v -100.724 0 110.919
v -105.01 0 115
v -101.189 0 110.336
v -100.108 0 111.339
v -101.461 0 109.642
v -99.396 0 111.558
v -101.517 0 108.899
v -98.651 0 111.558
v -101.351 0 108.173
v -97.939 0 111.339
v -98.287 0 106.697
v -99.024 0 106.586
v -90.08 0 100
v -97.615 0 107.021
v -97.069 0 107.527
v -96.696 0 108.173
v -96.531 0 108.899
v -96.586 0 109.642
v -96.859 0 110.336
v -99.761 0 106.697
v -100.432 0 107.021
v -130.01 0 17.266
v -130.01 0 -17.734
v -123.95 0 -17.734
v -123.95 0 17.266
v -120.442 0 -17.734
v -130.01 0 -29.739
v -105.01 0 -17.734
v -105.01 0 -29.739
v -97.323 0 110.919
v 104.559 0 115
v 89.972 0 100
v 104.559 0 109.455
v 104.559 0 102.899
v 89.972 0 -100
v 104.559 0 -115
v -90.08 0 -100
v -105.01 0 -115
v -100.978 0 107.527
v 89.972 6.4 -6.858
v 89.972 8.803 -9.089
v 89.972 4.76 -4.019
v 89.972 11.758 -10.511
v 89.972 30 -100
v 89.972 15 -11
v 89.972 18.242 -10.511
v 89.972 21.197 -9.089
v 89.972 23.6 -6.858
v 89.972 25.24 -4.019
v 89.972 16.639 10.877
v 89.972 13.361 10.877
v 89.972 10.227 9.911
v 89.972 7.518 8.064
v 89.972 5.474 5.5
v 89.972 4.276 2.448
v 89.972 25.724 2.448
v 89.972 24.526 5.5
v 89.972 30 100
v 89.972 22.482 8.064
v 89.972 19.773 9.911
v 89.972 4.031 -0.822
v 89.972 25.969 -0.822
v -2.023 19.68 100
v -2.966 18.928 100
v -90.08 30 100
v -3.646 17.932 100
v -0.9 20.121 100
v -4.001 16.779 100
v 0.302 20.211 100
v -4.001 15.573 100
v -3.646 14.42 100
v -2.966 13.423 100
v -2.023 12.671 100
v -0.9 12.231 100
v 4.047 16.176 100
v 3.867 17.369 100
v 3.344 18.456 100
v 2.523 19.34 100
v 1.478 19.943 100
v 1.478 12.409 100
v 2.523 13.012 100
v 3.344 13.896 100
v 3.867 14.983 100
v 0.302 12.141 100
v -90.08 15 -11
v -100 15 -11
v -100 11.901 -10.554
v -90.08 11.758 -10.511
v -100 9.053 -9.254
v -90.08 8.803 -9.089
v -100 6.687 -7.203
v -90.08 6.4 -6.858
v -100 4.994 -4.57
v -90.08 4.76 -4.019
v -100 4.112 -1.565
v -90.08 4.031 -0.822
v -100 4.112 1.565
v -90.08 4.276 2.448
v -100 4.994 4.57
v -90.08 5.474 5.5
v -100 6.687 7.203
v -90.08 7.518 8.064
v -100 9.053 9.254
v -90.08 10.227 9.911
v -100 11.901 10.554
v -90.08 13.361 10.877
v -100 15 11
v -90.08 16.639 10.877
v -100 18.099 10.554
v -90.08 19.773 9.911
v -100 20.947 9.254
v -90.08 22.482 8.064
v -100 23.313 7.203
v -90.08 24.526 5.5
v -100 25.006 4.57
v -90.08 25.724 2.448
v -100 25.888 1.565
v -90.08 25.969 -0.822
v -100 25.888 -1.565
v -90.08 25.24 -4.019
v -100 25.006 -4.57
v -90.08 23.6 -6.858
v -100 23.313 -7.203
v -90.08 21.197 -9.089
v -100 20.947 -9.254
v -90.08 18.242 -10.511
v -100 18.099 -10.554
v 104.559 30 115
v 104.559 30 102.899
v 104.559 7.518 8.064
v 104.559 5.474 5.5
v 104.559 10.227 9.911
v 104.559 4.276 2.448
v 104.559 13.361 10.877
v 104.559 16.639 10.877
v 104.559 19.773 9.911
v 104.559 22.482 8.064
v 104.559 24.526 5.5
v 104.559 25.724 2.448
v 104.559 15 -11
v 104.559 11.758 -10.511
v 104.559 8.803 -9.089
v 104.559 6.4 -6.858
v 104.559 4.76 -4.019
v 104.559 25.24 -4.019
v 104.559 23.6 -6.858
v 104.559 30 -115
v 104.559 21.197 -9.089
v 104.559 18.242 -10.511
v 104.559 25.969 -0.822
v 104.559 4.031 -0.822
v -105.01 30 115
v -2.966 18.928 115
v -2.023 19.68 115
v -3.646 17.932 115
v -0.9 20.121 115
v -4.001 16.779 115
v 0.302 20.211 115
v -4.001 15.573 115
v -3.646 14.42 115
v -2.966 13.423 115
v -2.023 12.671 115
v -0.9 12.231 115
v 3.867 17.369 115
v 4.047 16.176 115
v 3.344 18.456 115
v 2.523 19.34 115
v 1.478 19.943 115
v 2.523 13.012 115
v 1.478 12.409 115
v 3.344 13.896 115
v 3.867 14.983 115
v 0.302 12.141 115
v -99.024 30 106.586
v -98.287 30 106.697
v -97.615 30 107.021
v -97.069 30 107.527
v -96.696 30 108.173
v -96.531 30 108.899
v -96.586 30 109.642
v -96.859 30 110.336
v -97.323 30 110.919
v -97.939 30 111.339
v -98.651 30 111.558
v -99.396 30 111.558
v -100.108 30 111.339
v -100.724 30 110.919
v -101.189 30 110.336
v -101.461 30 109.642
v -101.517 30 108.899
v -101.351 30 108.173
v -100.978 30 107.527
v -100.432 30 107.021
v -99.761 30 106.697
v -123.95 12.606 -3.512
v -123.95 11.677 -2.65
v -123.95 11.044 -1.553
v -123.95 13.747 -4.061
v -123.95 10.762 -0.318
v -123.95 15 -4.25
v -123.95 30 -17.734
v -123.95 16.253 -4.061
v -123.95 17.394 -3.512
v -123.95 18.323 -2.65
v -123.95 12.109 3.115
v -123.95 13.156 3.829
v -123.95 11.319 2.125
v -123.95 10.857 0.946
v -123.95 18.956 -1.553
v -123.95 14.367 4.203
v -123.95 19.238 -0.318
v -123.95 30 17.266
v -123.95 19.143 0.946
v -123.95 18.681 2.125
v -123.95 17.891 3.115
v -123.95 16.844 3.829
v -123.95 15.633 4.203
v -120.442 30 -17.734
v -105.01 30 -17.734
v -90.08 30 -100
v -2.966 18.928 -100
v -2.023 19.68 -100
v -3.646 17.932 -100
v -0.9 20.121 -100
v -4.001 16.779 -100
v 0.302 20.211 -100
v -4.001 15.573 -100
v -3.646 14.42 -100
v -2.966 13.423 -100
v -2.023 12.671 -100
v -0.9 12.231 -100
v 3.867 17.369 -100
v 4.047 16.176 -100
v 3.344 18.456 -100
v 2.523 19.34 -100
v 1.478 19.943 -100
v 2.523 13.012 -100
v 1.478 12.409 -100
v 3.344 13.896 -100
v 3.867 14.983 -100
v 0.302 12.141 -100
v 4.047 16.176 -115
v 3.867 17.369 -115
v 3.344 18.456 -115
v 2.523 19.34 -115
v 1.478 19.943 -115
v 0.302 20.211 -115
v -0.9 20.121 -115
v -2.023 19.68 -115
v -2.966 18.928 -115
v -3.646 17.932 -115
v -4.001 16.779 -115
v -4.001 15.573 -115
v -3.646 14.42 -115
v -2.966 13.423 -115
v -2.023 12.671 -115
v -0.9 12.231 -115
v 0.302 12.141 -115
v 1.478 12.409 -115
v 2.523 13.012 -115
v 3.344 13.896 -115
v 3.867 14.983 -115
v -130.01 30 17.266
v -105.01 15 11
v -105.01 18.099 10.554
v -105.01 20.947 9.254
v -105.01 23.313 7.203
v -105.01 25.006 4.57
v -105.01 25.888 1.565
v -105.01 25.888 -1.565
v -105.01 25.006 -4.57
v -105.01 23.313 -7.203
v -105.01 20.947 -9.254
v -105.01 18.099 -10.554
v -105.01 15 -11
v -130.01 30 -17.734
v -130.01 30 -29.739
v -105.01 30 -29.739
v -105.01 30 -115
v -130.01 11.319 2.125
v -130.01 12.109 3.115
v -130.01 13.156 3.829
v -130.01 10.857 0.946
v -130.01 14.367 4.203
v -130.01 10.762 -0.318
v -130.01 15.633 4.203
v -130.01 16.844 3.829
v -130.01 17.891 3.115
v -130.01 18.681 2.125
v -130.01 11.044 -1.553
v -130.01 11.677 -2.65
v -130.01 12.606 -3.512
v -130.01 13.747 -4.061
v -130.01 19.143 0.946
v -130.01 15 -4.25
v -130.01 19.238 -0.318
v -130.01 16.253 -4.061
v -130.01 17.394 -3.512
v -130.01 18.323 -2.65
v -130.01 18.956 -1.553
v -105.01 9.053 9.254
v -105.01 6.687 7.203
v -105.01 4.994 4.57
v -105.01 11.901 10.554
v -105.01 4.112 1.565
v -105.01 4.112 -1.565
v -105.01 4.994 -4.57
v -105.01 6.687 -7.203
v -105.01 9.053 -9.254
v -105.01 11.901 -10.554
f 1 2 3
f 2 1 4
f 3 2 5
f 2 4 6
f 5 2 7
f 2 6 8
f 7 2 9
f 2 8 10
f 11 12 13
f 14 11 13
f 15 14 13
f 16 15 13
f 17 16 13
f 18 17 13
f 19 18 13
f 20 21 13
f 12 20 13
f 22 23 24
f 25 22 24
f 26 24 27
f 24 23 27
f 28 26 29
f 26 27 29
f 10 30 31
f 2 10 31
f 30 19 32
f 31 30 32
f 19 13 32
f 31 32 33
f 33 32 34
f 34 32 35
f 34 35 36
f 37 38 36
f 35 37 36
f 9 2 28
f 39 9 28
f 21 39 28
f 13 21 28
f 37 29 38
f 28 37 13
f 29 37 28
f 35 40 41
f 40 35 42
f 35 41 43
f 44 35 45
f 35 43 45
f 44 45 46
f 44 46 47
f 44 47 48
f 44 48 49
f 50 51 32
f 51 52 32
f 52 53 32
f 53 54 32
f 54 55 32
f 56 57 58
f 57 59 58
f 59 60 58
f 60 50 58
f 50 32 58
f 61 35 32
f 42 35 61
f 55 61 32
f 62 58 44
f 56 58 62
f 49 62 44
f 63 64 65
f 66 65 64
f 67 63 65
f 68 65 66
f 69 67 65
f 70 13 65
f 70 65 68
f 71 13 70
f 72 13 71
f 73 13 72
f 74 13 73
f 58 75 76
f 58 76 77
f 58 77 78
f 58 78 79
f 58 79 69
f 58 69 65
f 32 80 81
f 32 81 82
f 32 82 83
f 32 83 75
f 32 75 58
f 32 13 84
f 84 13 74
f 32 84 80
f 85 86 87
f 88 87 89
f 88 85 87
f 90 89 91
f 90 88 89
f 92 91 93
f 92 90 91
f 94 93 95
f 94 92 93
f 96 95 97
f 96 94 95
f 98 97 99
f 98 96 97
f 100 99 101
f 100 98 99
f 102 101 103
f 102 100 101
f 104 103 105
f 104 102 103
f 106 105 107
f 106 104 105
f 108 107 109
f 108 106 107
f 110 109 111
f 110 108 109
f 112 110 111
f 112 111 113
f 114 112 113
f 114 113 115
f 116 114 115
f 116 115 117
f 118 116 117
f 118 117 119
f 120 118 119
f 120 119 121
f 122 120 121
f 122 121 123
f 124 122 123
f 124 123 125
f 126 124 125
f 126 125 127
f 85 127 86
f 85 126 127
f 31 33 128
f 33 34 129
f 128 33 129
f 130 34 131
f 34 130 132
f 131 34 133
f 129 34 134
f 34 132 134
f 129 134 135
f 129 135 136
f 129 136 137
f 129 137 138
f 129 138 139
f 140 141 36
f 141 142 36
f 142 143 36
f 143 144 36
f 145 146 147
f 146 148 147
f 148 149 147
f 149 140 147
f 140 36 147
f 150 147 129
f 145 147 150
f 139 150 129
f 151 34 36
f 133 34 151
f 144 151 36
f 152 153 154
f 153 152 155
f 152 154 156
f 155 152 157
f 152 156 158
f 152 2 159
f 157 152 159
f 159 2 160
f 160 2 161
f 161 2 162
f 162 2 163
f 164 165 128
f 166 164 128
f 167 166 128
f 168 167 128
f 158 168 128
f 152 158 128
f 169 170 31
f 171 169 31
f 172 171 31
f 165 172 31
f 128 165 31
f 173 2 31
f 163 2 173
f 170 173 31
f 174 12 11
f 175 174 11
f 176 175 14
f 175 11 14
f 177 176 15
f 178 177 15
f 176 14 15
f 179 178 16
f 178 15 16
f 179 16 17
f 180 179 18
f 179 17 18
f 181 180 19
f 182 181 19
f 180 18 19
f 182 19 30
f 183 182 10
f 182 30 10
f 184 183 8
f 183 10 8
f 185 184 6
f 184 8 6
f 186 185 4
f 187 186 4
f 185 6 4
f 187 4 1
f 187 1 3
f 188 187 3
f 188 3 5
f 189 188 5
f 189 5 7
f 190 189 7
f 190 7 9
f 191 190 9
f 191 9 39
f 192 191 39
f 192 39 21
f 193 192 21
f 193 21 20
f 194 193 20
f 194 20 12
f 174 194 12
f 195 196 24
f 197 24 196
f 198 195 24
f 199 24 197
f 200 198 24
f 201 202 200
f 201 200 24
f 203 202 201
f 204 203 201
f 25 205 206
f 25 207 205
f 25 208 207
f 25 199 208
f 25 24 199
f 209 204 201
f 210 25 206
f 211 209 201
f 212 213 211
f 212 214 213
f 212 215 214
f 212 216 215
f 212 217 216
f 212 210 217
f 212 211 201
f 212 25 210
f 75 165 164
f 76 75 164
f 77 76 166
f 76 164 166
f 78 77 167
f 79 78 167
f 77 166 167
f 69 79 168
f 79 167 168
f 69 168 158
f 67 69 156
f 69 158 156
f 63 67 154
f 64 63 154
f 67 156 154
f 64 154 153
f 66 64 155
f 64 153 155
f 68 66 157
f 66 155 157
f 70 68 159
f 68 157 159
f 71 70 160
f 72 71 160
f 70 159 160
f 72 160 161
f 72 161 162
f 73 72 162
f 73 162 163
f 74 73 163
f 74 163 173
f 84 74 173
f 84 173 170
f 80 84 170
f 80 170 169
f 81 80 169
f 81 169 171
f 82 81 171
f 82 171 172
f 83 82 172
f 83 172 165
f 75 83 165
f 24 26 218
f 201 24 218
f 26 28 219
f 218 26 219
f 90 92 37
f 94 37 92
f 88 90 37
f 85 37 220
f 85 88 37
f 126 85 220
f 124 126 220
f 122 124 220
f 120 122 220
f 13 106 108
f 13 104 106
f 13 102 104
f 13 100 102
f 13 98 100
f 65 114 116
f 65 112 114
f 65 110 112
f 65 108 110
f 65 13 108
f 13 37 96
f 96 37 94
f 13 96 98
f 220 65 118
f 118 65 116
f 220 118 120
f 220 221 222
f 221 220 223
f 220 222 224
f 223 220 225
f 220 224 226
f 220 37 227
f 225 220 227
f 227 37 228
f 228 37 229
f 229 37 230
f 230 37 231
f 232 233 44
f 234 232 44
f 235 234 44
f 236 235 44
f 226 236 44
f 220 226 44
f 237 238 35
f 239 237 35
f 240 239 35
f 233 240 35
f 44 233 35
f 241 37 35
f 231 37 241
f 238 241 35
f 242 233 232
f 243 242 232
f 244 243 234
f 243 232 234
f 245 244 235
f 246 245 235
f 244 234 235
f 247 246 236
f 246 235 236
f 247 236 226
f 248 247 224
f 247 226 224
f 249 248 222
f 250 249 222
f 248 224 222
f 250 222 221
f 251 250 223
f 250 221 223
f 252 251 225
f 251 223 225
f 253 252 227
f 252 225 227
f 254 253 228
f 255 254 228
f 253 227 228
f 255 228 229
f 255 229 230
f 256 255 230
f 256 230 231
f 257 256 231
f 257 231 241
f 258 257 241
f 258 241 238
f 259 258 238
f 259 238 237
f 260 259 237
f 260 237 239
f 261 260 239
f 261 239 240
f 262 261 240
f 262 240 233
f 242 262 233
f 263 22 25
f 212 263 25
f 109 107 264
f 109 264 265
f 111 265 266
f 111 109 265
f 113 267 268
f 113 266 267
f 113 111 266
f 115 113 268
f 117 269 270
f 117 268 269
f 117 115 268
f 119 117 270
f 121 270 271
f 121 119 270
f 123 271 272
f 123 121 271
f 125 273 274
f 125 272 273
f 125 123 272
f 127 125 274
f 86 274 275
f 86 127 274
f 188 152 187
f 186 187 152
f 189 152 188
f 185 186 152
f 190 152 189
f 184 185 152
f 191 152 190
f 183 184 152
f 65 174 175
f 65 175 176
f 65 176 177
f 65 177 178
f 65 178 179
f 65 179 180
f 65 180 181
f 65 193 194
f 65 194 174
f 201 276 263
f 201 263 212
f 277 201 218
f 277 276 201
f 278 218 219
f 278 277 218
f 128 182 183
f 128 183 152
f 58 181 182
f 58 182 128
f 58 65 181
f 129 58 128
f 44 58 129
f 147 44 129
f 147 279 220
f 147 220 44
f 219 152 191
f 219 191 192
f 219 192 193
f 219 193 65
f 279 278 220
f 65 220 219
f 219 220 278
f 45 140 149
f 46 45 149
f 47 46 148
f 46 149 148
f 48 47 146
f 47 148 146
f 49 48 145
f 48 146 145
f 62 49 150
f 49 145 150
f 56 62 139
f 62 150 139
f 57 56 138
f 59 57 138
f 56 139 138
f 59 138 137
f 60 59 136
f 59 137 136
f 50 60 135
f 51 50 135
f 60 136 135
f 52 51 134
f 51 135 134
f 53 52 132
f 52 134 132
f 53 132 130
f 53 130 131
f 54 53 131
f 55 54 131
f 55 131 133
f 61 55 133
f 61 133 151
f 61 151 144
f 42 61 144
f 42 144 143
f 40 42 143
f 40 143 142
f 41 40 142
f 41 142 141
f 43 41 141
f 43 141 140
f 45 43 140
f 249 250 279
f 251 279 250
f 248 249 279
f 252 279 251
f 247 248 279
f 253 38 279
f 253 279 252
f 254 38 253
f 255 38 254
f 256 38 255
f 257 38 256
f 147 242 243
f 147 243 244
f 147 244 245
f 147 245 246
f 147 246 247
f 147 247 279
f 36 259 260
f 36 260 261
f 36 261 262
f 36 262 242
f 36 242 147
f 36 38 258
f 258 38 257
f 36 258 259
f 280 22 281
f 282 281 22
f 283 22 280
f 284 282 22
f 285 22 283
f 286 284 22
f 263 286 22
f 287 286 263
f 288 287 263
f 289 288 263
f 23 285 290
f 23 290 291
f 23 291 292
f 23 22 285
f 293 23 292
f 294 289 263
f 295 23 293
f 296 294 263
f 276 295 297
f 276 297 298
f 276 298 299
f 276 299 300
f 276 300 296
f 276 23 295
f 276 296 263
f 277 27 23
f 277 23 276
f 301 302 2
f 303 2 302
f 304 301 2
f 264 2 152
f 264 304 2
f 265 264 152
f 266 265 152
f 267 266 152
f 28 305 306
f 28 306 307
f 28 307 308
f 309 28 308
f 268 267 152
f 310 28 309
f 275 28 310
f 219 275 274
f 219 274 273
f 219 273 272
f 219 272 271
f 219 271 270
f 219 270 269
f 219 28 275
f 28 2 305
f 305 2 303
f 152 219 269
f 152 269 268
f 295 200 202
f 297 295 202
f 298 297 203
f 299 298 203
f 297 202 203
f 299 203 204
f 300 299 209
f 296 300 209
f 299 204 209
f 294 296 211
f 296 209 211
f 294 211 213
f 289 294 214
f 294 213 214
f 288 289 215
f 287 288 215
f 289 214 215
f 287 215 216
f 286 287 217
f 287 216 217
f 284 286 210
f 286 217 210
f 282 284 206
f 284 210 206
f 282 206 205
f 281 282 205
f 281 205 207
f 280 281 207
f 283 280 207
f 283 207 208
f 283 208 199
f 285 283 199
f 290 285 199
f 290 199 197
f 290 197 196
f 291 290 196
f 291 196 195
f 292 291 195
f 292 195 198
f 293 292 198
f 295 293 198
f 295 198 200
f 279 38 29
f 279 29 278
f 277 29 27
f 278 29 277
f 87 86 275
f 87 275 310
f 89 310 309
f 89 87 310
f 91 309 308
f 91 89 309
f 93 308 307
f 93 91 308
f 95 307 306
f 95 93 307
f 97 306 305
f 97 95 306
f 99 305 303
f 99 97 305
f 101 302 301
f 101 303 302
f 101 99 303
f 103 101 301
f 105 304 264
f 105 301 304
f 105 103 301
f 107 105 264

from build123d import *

# Parameters (mm, degrees)
SKETCH1_W            = 230
SKETCH1_H            = 230
SKETCH1_W_2          = 200
SKETCH1_H_2          = 200
BOSS_EXTRUDE1_DEPTH  = 30
SKETCH2_R            = 11
CUT_EXTRUDE3_DEPTH   = 206
SKETCH3_W            = 12.648408852
SKETCH3_H            = 30
BOSS_EXTRUDE2_DEPTH  = 28
SKETCH4_W            = 33.277006623
SKETCH4_H            = 30
BOSS_EXTRUDE4_DEPTH  = 41
SKETCH6_R            = 4
CUT_EXTRUDE4_DEPTH   = 218
SKETCH8_R            = 4.046690546
CUT_EXTRUDE6_DEPTH   = 280
CUT_EXTRUDE7_START   = -230
SKETCH9_R            = 11
CUT_EXTRUDE7_DEPTH   = 230
SKETCH11_W           = 19.776160892
SKETCH11_H           = 30
CUT_EXTRUDE8_DEPTH   = 41
SKETCH12_R           = 4
CUT_EXTRUDE9_DEPTH   = 264
SKETCH13_R           = 4
CUT_EXTRUDE10_DEPTH  = 264
SKETCH15_W           = 8.223839108
SKETCH15_H           = 30
CUT_EXTRUDE11_DEPTH  = 64
SKETCH16_W           = 6.512440182
SKETCH16_H           = 30
BOSS_EXTRUDE5_DEPTH  = 40
SKETCH17_R           = 4
CUT_EXTRUDE12_DEPTH  = 276
SKETCH18_W           = 10.028465144
SKETCH18_H           = 30
BOSS_EXTRUDE6_DEPTH  = 203
SKETCH19_W           = 9.920001469
SKETCH19_H           = 30
BOSS_EXTRUDE7_DEPTH  = 203
SKETCH21_W           = 19.776160892
SKETCH21_H           = 30
CUT_EXTRUDE13_DEPTH  = 203
SKETCH22_W           = 10.441032334
SKETCH22_H           = 30
CUT_EXTRUDE14_DEPTH  = 278
SKETCH23_W           = 4.062093177
SKETCH23_H           = 12.100968139
BOSS_EXTRUDE8_DEPTH  = 30
SKETCH24_W           = 9.989580678
SKETCH24_H           = 30
CUT_EXTRUDE15_DEPTH  = 248
CUT_EXTRUDE16_START  = -248
SKETCH25_R           = 11
CUT_EXTRUDE16_DEPTH  = 248
SKETCH26_W           = 12.005407817
SKETCH26_H           = 30
BOSS_EXTRUDE9_DEPTH  = 25
SKETCH27_W           = 9.568763957
SKETCH27_H           = 30
BOSS_EXTRUDE10_DEPTH = 35
SKETCH28_W           = 3.507869301
SKETCH28_H           = 30
CUT_EXTRUDE17_DEPTH  = 35
SKETCH29_R           = 4.25
CUT_EXTRUDE18_DEPTH  = 257
SKETCH33_R           = 2.5
CUT_EXTRUDE20_DEPTH  = 44


with BuildPart() as part:
    # Sketch1 → Boss-Extrude1 (new body)
    with BuildSketch(Plane(origin=(0, 0, 0), x_dir=(1, 0, 0), z_dir=(0, 1, 0))):
        Rectangle(SKETCH1_W, SKETCH1_H)
        Rectangle(SKETCH1_W_2, SKETCH1_H_2, mode=Mode.SUBTRACT)
    extrude(amount=BOSS_EXTRUDE1_DEPTH)

    # Sketch2 → Cut-Extrude3 (cut)
    with BuildSketch(Plane(origin=(115, 0, 0), x_dir=(0, 0, -1), z_dir=(1, 0, 0))):
        with Locations((0, 15)):
            Circle(SKETCH2_R)
    extrude(amount=-CUT_EXTRUDE3_DEPTH, mode=Mode.SUBTRACT)

    # Sketch3 → Boss-Extrude2 (add)
    with BuildSketch(Plane(origin=(115, 0, 0), x_dir=(0, 0, -1), z_dir=(1, 0, 0))):
        with Locations((26.610788675, 15)):
            Rectangle(SKETCH3_W, SKETCH3_H)
    extrude(amount=BOSS_EXTRUDE2_DEPTH)

    # Sketch4 → Boss-Extrude4 (add)
    with BuildSketch(Plane.XY.offset(-20.286584249)):
        with Locations((126.361496689, 15)):
            Rectangle(SKETCH4_W, SKETCH4_H)
    extrude(amount=BOSS_EXTRUDE4_DEPTH)

    # Sketch6 → Cut-Extrude4 (cut)
    with BuildSketch(Plane.ZY.offset(115)):
        with Locations((0, 15)):
            Circle(SKETCH6_R)
    extrude(amount=-CUT_EXTRUDE4_DEPTH, mode=Mode.SUBTRACT)

    # Sketch8 → Cut-Extrude6 (cut)
    with BuildSketch(Plane.XY.offset(115)):
        with Locations((0, 16.175919114)):
            Circle(SKETCH8_R)
    extrude(amount=-CUT_EXTRUDE6_DEPTH, mode=Mode.SUBTRACT)

    # Sketch9 → Cut-Extrude7 (cut)
    with BuildSketch(Plane.ZY.offset(115).offset(CUT_EXTRUDE7_START)):
        with Locations((0, 15)):
            Circle(SKETCH9_R)
    extrude(amount=CUT_EXTRUDE7_DEPTH, mode=Mode.SUBTRACT)

    # Sketch11 → Cut-Extrude8 (cut)
    with BuildSketch(Plane.XY.offset(20.713415751)):
        with Locations((124.888080446, 15)):
            Rectangle(SKETCH11_W, SKETCH11_H)
    extrude(amount=-CUT_EXTRUDE8_DEPTH, mode=Mode.SUBTRACT)

    # Sketch12 → Cut-Extrude9 (cut)
    with BuildSketch(Plane.ZY.offset(115)):
        with Locations((0, 15)):
            Circle(SKETCH12_R)
    extrude(amount=-CUT_EXTRUDE9_DEPTH, mode=Mode.SUBTRACT)

    # Sketch13 → Cut-Extrude10 (cut)
    with BuildSketch(Plane(origin=(0, 30, 0), x_dir=(1, 0, 0), z_dir=(0, 1, 0))):
        with Locations(Location((106.851068212, -106.17718303, 0), (0, 0, 270))):
            Circle(SKETCH13_R)
    extrude(amount=-CUT_EXTRUDE10_DEPTH, mode=Mode.SUBTRACT)

    # Sketch15 → Cut-Extrude11 (cut)
    with BuildSketch(Plane.XY.offset(20.713415751)):
        with Locations((138.888080446, 15)):
            Rectangle(SKETCH15_W, SKETCH15_H)
    extrude(amount=-CUT_EXTRUDE11_DEPTH, mode=Mode.SUBTRACT)

    # Sketch16 → Boss-Extrude5 (add)
    with BuildSketch(Plane.XY.offset(-20.286584249)):
        with Locations((131.519940801, 15)):
            Rectangle(SKETCH16_W, SKETCH16_H)
    extrude(amount=BOSS_EXTRUDE5_DEPTH)

    # Sketch17 → Cut-Extrude12 (cut)
    with BuildSketch(Plane.ZY.offset(115)):
        with Locations((0, 15)):
            Circle(SKETCH17_R)
    extrude(amount=-CUT_EXTRUDE12_DEPTH, mode=Mode.SUBTRACT)

    # Sketch18 → Boss-Extrude6 (add)
    with BuildSketch(Plane(origin=(0, 0, 100), x_dir=(-1, 0, 0), z_dir=(0, 0, -1))):
        with Locations((-94.985767428, 15)):
            Rectangle(SKETCH18_W, SKETCH18_H)
    extrude(amount=BOSS_EXTRUDE6_DEPTH)

    # Sketch19 → Boss-Extrude7 (add)
    with BuildSketch(Plane(origin=(0, 0, 100), x_dir=(-1, 0, 0), z_dir=(0, 0, -1))):
        with Locations((95.039999266, 15)):
            Rectangle(SKETCH19_W, SKETCH19_H)
    extrude(amount=BOSS_EXTRUDE7_DEPTH)

    # Sketch21 → Cut-Extrude13 (cut)
    with BuildSketch(Plane(origin=(0, 0, -32.934993101), x_dir=(-1, 0, 0), z_dir=(0, 0, -1))):
        with Locations((-124.888080446, 15)):
            Rectangle(SKETCH21_W, SKETCH21_H)
    extrude(amount=-CUT_EXTRUDE13_DEPTH, mode=Mode.SUBTRACT)

    # Sketch22 → Cut-Extrude14 (cut)
    with BuildSketch(Plane(origin=(0, 0, -115), x_dir=(-1, 0, 0), z_dir=(0, 0, -1))):
        with Locations((-109.779483833, 15)):
            Rectangle(SKETCH22_W, SKETCH22_H)
    extrude(amount=-CUT_EXTRUDE14_DEPTH, mode=Mode.SUBTRACT)

    # Sketch23 → Boss-Extrude8 (add)
    with BuildSketch(Plane(origin=(0, 30, 0), x_dir=(1, 0, 0), z_dir=(0, 1, 0))):
        with Locations((102.527921077, -108.949515931)):
            Rectangle(SKETCH23_W, SKETCH23_H)
    extrude(amount=-BOSS_EXTRUDE8_DEPTH)

    # Sketch24 → Cut-Extrude15 (cut)
    with BuildSketch(Plane(origin=(0, 0, -115), x_dir=(-1, 0, 0), z_dir=(0, 0, -1))):
        with Locations((110.005209661, 15)):
            Rectangle(SKETCH24_W, SKETCH24_H)
    extrude(amount=-CUT_EXTRUDE15_DEPTH, mode=Mode.SUBTRACT)

    # Sketch25 → Cut-Extrude16 (cut)
    with BuildSketch(Plane.ZY.offset(105.010419322).offset(CUT_EXTRUDE16_START)):
        with Locations(Location((0, 15, 0), (0, 0, 180))):
            Circle(SKETCH25_R)
    extrude(amount=CUT_EXTRUDE16_DEPTH, mode=Mode.SUBTRACT)

    # Sketch26 → Boss-Extrude9 (add)
    with BuildSketch(Plane.ZY.offset(105.010419322)):
        with Locations((-23.736715717, 15)):
            Rectangle(SKETCH26_W, SKETCH26_H)
    extrude(amount=BOSS_EXTRUDE9_DEPTH)

    # Sketch27 → Boss-Extrude10 (add)
    with BuildSketch(Plane.XY.offset(-17.734011808)):
        with Locations((-125.226037344, 15)):
            Rectangle(SKETCH27_W, SKETCH27_H)
    extrude(amount=BOSS_EXTRUDE10_DEPTH)

    # Sketch28 → Cut-Extrude17 (cut)
    with BuildSketch(Plane.XY.offset(17.265988192)):
        with Locations((-122.195590016, 15)):
            Rectangle(SKETCH28_W, SKETCH28_H)
    extrude(amount=-CUT_EXTRUDE17_DEPTH, mode=Mode.SUBTRACT)

    # Sketch29 → Cut-Extrude18 (cut)
    with BuildSketch(Plane(origin=(104.558967666, 0, 0), x_dir=(0, 0, -1), z_dir=(1, 0, 0))):
        with Locations((0, 15)):
            Circle(SKETCH29_R)
    extrude(amount=-CUT_EXTRUDE18_DEPTH, mode=Mode.SUBTRACT)

    # Sketch33 → Cut-Extrude20 (cut)
    with BuildSketch(Plane(origin=(0, 0, 0), x_dir=(-1, 0, 0), z_dir=(0, -1, 0))):
        with Locations(Location((99.023642446, -109.086175653, 0), (0, 0, 90))):
            Circle(SKETCH33_R)
    extrude(amount=-CUT_EXTRUDE20_DEPTH, mode=Mode.SUBTRACT)


solid = part.part
